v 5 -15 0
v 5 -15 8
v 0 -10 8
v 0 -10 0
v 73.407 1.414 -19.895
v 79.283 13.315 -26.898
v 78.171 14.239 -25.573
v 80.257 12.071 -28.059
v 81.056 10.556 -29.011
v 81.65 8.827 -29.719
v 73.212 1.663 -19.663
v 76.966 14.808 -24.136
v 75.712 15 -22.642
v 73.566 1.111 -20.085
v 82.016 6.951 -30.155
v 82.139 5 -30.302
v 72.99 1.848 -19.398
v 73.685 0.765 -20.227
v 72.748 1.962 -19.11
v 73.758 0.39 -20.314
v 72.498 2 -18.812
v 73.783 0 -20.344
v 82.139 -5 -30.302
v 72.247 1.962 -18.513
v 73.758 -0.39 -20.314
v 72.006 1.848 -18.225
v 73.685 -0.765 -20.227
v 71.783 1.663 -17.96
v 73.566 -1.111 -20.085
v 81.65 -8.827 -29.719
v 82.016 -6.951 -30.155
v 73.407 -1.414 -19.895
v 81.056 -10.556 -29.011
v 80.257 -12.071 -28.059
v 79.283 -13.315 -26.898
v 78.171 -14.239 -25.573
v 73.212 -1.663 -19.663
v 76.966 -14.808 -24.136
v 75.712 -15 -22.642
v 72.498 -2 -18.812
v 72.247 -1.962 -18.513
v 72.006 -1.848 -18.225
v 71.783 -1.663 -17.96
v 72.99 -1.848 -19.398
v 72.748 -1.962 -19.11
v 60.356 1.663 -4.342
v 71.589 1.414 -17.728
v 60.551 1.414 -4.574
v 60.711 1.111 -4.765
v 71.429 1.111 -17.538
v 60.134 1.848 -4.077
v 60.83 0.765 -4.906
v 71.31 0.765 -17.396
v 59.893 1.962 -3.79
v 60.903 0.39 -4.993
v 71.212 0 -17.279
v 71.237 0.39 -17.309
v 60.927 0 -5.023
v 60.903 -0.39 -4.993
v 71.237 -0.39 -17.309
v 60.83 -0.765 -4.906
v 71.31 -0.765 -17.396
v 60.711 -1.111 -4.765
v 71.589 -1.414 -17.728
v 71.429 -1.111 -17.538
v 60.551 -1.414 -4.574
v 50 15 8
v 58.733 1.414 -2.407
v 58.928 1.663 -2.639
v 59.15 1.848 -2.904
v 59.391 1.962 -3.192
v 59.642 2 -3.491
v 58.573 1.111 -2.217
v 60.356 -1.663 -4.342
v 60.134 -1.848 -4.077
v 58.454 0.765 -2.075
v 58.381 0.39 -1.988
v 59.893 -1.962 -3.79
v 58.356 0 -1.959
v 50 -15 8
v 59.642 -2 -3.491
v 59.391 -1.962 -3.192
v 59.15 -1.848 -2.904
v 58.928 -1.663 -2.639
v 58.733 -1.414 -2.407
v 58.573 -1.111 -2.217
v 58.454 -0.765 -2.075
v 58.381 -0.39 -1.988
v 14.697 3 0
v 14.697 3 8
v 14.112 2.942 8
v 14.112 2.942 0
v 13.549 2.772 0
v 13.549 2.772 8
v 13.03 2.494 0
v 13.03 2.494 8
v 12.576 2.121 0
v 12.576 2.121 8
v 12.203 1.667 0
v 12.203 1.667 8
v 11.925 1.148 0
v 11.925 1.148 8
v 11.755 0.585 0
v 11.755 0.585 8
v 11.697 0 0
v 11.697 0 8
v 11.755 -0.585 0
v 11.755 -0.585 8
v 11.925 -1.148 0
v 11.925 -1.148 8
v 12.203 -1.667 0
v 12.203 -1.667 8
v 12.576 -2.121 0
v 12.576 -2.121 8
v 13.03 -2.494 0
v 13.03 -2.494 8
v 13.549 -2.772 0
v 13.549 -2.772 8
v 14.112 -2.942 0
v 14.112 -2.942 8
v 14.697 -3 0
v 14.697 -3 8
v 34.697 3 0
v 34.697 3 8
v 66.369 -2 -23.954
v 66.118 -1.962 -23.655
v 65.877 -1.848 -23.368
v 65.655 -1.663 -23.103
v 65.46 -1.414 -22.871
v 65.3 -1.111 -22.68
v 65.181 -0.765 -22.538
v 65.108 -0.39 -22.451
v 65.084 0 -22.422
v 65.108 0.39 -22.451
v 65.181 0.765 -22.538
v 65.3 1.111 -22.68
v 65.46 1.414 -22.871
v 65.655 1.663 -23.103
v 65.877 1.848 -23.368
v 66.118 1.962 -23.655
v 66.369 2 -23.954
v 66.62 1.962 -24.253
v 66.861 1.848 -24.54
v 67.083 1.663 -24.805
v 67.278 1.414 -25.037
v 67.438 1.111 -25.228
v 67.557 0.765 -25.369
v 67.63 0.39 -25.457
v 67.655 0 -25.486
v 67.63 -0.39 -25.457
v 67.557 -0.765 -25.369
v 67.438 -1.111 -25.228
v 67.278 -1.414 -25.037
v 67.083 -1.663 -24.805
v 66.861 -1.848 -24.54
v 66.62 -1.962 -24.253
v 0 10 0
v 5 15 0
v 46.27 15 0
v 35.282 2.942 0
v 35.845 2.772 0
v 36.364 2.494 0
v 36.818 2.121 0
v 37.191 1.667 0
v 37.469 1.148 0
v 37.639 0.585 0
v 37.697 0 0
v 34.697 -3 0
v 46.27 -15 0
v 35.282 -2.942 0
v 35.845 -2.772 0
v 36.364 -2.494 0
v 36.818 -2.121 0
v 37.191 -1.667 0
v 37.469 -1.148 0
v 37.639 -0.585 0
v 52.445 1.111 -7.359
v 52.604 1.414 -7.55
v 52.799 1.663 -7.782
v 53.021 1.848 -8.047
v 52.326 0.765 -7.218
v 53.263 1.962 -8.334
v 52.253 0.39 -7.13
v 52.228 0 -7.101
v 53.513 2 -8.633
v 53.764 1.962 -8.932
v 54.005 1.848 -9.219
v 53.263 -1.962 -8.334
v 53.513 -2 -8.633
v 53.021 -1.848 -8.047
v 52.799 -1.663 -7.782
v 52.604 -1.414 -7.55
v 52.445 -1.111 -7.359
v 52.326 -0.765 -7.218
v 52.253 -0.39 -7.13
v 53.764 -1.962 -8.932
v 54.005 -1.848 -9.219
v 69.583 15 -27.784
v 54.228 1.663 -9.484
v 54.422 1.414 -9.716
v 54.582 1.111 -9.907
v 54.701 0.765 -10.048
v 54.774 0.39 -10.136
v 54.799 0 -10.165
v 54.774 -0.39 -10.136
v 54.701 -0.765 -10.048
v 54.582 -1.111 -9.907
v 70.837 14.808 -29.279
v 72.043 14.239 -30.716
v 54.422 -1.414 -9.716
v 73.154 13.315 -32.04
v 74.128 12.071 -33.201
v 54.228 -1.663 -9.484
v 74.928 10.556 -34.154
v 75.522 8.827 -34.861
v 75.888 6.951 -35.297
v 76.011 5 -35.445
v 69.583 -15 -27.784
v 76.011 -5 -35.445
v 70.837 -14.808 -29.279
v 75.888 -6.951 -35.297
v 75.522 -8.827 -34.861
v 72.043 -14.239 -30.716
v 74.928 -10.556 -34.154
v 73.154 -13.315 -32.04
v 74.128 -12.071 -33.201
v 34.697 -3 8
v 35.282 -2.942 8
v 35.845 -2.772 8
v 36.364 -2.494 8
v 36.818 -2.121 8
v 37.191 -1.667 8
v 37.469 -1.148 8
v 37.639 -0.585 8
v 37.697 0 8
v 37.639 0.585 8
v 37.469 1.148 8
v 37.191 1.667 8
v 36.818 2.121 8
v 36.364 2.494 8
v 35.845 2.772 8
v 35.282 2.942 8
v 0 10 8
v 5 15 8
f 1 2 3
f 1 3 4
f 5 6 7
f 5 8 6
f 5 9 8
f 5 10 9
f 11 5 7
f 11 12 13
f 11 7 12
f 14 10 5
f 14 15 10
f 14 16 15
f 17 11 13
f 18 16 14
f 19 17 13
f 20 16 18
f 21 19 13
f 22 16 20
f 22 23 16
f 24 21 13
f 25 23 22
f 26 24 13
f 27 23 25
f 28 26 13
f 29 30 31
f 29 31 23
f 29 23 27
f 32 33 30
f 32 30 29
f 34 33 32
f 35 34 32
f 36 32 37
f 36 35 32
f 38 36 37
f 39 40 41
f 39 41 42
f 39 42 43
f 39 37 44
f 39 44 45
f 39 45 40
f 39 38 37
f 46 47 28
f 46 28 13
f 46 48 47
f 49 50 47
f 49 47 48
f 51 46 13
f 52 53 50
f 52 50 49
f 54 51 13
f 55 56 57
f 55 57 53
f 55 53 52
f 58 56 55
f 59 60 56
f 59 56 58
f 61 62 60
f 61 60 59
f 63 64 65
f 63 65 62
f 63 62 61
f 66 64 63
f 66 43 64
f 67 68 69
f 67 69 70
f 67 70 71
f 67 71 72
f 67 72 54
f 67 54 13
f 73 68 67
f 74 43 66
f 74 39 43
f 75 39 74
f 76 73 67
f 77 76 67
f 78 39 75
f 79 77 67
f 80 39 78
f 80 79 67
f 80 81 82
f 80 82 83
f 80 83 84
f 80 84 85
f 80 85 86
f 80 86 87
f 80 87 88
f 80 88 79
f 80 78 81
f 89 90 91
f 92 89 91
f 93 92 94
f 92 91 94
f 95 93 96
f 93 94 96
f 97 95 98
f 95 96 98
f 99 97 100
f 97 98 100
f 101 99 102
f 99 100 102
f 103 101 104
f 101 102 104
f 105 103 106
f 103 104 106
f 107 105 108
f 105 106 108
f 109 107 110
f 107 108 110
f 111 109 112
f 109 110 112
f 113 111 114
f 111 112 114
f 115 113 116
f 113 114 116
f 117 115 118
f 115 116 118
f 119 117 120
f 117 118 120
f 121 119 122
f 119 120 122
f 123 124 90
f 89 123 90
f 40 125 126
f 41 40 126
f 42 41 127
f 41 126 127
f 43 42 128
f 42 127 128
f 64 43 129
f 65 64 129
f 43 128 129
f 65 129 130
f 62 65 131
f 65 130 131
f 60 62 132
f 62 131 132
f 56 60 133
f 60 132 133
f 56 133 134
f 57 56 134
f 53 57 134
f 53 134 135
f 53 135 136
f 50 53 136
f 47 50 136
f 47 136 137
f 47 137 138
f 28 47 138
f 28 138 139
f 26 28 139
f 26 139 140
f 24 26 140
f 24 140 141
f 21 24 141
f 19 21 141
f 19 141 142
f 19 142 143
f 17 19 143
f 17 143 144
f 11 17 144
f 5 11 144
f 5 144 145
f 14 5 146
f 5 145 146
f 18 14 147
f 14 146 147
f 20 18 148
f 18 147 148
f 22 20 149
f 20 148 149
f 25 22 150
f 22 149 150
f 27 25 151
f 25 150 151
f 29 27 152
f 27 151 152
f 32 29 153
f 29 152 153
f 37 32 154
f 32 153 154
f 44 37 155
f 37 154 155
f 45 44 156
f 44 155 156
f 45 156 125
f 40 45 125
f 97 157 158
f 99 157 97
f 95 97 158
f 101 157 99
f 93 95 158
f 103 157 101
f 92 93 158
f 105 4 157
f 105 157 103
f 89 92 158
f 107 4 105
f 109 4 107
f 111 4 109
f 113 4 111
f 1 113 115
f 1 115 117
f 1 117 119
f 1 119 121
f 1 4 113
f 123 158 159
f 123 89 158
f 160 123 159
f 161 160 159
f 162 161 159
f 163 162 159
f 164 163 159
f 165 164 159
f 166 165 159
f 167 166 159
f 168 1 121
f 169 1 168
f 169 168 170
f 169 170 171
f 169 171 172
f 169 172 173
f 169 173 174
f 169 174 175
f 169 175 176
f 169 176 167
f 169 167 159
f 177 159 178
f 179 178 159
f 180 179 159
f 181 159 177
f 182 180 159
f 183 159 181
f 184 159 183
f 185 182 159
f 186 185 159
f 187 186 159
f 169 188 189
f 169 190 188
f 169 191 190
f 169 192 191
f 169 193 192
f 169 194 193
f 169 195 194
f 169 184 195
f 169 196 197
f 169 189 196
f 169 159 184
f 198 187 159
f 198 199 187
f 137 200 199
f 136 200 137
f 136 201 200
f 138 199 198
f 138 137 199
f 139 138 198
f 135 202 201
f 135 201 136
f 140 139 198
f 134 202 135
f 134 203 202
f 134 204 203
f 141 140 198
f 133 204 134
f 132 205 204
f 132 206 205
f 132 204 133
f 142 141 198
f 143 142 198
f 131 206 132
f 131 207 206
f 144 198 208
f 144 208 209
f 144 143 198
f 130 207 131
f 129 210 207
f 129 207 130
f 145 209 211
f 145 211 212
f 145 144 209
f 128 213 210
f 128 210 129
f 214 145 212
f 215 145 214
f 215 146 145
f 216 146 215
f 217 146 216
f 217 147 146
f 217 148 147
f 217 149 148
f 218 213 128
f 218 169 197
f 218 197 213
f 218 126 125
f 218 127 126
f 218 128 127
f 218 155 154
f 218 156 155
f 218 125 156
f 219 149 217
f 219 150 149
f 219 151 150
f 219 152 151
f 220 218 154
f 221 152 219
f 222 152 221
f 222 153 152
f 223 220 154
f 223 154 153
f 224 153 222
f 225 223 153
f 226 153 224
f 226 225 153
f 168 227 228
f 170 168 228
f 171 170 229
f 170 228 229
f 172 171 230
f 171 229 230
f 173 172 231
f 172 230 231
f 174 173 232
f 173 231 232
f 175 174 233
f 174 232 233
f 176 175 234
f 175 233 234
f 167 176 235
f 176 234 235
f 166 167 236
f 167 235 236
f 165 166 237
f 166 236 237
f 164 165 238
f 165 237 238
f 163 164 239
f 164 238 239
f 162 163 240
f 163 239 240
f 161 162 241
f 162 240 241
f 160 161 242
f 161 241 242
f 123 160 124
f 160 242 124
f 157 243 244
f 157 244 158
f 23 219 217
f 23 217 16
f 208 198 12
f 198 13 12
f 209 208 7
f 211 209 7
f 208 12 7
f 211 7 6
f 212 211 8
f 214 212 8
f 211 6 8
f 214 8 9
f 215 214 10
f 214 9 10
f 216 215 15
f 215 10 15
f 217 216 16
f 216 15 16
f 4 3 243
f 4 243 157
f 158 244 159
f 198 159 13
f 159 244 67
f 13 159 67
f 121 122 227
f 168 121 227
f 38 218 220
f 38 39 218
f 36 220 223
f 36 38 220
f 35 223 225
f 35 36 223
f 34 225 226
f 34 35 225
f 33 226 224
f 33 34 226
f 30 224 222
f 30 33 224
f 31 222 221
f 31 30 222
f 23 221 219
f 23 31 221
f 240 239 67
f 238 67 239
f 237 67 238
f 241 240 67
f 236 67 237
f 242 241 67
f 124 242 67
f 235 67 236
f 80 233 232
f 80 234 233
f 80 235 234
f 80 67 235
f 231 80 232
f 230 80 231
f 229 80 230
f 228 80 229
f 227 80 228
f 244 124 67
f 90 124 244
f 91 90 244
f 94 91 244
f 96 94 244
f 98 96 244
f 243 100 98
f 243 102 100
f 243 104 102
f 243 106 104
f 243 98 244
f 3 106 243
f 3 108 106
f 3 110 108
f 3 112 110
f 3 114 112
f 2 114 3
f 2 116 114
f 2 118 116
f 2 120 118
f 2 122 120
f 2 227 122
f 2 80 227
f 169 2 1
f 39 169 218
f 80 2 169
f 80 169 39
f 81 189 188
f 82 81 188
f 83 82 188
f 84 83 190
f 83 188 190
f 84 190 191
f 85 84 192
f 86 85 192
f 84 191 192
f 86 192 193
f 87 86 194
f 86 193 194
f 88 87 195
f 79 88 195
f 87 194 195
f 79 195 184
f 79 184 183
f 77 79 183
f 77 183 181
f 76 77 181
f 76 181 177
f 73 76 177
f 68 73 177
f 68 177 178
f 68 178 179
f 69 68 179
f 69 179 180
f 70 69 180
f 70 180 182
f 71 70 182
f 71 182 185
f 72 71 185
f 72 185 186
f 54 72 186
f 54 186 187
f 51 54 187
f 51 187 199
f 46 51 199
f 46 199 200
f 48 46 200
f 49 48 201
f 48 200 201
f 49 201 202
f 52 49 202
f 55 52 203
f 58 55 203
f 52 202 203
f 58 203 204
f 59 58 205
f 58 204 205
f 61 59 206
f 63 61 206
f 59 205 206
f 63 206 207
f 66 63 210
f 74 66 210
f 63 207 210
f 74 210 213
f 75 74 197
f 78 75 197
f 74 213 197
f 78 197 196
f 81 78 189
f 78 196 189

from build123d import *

# Parameters (mm, degrees)
F1_DEPTH = 15
F3_DEPTH = 43.4455230334
F5_D     = 4
F6_R     = 10
F7_SIZE  = 5


with BuildPart() as f1:
    # F0 (on Front) → F1 (new body, symmetric)
    with BuildSketch(Plane.XZ):
        Polygon((0, 8), (0, 0), (46.2695387348, 0), (76.0110249394, -35.4445230334), (82.1393804843, -30.3022221559), (50, 8), align=None)
    extrude(amount=F1_DEPTH, both=True)

    # F2 (on face) → F3 (cut, through all)
    with BuildSketch(Plane.XY.offset(8)):
        with BuildLine():
            ThreePointArc((14.6969384567, 3), (11.6969384567, 0), (14.6969384567, -3))
            Line((14.6969384567, -3), (34.6969384567, -3))
            ThreePointArc((34.6969384567, -3), (37.6969384567, 0), (34.6969384567, 3))
            Line((34.6969384567, 3), (14.6969384567, 3))
        make_face()
    extrude(amount=-F3_DEPTH, mode=Mode.SUBTRACT)

    # F5 (through all)
    with Locations(Plane(origin=(33.2804354537, 0, 27.9256011146), x_dir=(0, 1, 0), z_dir=(0.7660444431, 0, 0.6427876097))):
        with Locations((0, -41.0110249394), (0, -61.0110249394)):
            Hole(F5_D / 2)

    # F6
    f6_edges = [f1.edges().sort_by_distance(p)[0] for p in [
        (79.075203, -15, -32.873373),
        (79.075203, 15, -32.873373),
    ]]
    fillet(f6_edges, radius=F6_R)

    # F7
    f7_edges = [f1.edges().sort_by_distance(p)[0] for p in [
        (0, 15, 4),
        (0, -15, 4),
    ]]
    chamfer(f7_edges, length=F7_SIZE)


solid = f1.part
